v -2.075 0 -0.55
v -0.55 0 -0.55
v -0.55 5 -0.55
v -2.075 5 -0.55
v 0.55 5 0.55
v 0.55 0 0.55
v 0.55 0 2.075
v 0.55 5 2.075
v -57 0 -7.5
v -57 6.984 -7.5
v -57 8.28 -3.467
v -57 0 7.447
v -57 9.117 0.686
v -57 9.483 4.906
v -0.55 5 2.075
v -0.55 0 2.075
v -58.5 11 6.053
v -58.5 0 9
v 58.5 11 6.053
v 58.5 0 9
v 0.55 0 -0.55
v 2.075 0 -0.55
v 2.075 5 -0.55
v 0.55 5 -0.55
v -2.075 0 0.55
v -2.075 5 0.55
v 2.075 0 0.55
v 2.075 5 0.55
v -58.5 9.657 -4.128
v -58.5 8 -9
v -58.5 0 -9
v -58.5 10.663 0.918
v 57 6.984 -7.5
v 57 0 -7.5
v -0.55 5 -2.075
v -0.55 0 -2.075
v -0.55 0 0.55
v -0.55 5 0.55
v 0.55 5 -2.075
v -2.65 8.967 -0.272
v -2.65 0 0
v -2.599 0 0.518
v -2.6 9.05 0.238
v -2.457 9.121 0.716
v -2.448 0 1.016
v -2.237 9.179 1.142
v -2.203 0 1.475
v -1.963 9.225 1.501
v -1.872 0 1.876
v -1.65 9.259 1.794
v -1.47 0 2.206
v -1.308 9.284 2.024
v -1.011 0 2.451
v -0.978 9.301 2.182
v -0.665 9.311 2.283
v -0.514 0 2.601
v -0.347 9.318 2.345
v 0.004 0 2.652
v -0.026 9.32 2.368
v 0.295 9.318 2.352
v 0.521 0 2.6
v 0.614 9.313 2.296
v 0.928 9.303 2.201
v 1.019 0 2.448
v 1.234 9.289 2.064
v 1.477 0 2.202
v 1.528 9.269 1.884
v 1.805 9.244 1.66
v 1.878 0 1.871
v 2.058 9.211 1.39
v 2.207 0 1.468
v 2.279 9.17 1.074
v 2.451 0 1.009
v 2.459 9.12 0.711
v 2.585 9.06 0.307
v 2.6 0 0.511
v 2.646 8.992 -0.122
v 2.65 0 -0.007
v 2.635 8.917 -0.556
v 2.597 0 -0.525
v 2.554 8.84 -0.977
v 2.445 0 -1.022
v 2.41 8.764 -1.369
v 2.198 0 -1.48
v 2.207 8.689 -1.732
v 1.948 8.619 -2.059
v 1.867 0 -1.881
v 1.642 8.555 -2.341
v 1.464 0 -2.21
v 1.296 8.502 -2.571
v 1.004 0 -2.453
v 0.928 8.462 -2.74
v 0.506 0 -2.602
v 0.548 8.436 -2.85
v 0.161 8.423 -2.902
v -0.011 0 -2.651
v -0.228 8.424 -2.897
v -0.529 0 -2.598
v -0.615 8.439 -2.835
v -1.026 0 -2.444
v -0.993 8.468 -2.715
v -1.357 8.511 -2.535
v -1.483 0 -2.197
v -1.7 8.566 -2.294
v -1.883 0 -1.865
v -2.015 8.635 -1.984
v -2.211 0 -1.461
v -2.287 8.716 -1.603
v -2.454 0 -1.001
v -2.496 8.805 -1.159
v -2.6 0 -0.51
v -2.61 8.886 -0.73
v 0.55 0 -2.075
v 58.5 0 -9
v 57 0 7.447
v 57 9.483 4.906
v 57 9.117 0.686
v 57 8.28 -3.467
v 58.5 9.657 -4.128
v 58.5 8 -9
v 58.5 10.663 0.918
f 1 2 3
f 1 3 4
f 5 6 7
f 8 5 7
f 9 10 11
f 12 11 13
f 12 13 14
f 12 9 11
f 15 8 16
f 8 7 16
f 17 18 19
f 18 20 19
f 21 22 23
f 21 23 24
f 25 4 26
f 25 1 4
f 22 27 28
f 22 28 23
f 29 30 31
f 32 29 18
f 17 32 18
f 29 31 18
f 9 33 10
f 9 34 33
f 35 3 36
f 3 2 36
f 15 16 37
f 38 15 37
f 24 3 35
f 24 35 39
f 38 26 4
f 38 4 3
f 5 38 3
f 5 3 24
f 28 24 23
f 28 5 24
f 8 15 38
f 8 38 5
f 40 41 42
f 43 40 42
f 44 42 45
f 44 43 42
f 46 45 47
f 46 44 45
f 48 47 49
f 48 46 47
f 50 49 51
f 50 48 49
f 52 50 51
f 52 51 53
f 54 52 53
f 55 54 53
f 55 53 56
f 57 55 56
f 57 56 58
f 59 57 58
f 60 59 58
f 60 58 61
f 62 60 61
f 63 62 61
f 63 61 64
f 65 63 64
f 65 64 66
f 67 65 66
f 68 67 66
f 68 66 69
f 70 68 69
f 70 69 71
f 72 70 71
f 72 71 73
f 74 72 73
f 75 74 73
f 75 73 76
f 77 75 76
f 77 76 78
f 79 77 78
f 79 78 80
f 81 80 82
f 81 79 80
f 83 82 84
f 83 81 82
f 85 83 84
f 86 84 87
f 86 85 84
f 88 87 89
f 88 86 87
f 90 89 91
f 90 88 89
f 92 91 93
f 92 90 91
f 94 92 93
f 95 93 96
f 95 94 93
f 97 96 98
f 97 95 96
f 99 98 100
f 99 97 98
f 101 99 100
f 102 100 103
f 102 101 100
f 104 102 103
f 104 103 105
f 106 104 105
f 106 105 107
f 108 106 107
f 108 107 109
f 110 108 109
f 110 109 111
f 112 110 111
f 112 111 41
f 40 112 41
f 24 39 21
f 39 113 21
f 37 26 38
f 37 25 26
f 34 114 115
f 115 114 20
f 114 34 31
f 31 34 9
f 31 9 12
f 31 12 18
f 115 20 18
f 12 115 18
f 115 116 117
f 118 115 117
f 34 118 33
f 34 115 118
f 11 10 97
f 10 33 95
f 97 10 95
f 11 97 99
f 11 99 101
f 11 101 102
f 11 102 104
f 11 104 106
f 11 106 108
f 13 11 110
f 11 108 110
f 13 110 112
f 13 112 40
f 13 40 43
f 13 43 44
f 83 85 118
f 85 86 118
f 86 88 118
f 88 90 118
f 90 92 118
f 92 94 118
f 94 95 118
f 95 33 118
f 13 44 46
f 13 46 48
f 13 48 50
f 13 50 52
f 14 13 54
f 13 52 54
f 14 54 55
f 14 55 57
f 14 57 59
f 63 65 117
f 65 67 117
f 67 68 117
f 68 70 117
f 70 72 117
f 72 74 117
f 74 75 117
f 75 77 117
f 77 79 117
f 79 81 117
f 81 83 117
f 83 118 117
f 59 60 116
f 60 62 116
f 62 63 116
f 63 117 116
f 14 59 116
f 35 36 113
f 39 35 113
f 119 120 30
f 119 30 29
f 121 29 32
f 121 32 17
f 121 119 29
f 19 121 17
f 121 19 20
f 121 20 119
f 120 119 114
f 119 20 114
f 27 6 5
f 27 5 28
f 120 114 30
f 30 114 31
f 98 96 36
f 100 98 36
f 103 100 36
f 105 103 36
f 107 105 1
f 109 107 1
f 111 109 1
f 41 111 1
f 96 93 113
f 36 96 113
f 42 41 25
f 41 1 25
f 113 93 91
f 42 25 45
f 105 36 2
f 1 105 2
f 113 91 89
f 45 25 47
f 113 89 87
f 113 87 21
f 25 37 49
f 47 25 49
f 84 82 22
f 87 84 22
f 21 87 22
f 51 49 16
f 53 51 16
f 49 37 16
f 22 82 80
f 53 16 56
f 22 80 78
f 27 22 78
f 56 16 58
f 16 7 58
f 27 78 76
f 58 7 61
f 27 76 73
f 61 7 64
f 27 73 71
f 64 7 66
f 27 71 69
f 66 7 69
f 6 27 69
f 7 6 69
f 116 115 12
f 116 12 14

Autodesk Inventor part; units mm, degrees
ref_plane "YZ Plane" through (0, 0, 0) normal (1, 0, 0) x (0, 1, 0)
ref_plane "XZ Plane" through (0, 0, 0) normal (0, 1, 0) x (-1, 0, 0)
sketch "Spacebar base" plane through (0, 0, 0) normal (0, 1, 0) x (-1, 0, 0)
  line L0 (58.5, 9) -> (-58.5, 9)
  line L1 (-58.5, 9) -> (-58.5, -9)
  line L2 (-58.5, -9) -> (58.5, -9)
  line L3 (58.5, -9) -> (58.5, 9)
  line L4 (58.5, 9) -> (-58.5, -9) construction
  line L5 (-58.5, 9) -> (58.5, -9) construction
  point P0 (0, 0)
  dimension "d0" = 117
  dimension "d1" = 18
extrude "Spacebar Bulk" add sketch "Spacebar base" along normal blind 11
sketch "Curve Profile" plane through (58.5, 0, 9) normal (1, 0, 0) x (0, 0, -1)
  line L0 (0, 0) -> (18, 0) projected
  line L1 (0, 0) -> (2.9474, 11)
  line L2 (0, 11) -> (18, 11) projected
  line L3 (18, 0) -> (18, 11) projected
  arc A0 (18, 8) -> (2.9474, 11) centre (2.9474, -28.2633) ccw
  line L4 (0, 0) -> (0, 11) projected
  line L5 (18, 8) -> (18, 0)
  line L6 (18, 0) -> (0, 0)
  point P0 (9, 0)
  dimension "d4" = 15
  dimension "d9" = 8
extrude "Curve Cutaway" cut sketch "Curve Profile" against normal up to surface (117 mm away) contours L1 A0 L3 L0 keep common part
shell "Inner Shell" thickness 1.5 removed faces 1 at (19.5, 0, 3)
ref_plane "PoleBase Plane" through (57, 9.4826, 4.9062) normal (0, 0.9995, -0.0304) x (-1, 0, 0)
sketch "Center Circle" plane through (57, 9.4826, 4.9062) normal (0, 0.9995, -0.0304) x (-1, 0, 0)
  circle A0 centre (57, -5.1918) radius 2.65
  dimension "d11" = 5.3
extrude "Pole Extrusion" add sketch "Center Circle" against normal up to surface surface through (0, 0, 0) normal (0, 1, 0)
sketch "Sketch4" plane through (0, 0, 0) normal (0, -1, 0) x (1, 0, 0)
  line L0 (-2.075, 0.55) -> (2.075, 0.55)
  line L1 (2.075, 0.55) -> (2.075, -0.55)
  line L2 (2.075, -0.55) -> (-2.075, -0.55)
  line L3 (-2.075, -0.55) -> (-2.075, 0.55)
  line L4 (-2.075, 0.55) -> (2.075, -0.55) construction
  line L5 (2.075, 0.55) -> (-2.075, -0.55) construction
  line L6 (0.55, 2.075) -> (-0.55, 2.075)
  line L7 (-0.55, 2.075) -> (-0.55, -2.075)
  line L8 (-0.55, -2.075) -> (0.55, -2.075)
  line L9 (0.55, -2.075) -> (0.55, 2.075)
  line L10 (0.55, 2.075) -> (-0.55, -2.075) construction
  line L11 (-0.55, 2.075) -> (0.55, -2.075) construction
  point P0 (0, 0)
  dimension "d14" = 4.15
  dimension "d15" = 1.1
  dimension "d16" = 1.1
  dimension "d17" = 4.15
extrude "Extrusion4" cut sketch "Sketch4" against normal blind 5
equation "\"d0\" = b_space"
equation "\"d1\" = k_width"
equation "\"d10\" = k_wthick"
equation "\"d11\" = k_poledia"
equation "\"d14\" = k_cmxl"
equation "\"d15\" = k_cmxw"
equation "\"d16\" = k_cmxw"
equation "\"d17\" = k_cmxl"
equation "\"k_width\" = 18"
equation "\"k_height\" = 16.5"
equation "\"k_height_t\" = 16"
equation "\"k_taper1\" = 1.5"
equation "\"k_taper2\" = 0.5"
equation "\"k_staper\" = 1"
equation "\"k_sradius\" = 4"
equation "\"k_ltaper\" = 1.5"
equation "\"k_lradius\" = 6"
equation "\"k_radius\" = 6"
equation "\"k_wthick\" = 1.5"
equation "\"k_ribthick\" = 1.5"
equation "\"k_ribheight\" = 5"
equation "\"k_poleoff\" = 2.25"
equation "\"k_poledia\" = 5.3"
equation "\"k_cmxw\" = 1.1"
equation "\"k_cmxl\" = 4.15"
equation "\"s_bwidth\" = 14.4"
equation "\"s_poleh\" = 3.6"
equation "\"s_polebw\" = 5.4"
equation "\"s_polebl\" = 7.45"
equation "\"b_pad\" = 1"
equation "\"b_tab\" = 27"
equation "\"b_caps\" = 31.5"
equation "\"b_lshift\" = 40.5"
equation "\"b_rshift\" = 49.5"
equation "\"b_ctrl\" = 22.5"
equation "\"b_space\" = 117"
equation "\"b_width\" = 285"
equation "\"b_height\" = 77"
equation "\"k_taper_wide\" = 1.5"
equation "\"k_height_low\" = 15"
equation "\"k_taper_thin\" = 0.0001"
equation "\"k_shortening\" = 4.5"
equation "\"k_cmxd\" = 4"
equation "\"k_taper_side\" = 0.5"
properties part number "spacebar-keycap_mockup_cherrymx"
